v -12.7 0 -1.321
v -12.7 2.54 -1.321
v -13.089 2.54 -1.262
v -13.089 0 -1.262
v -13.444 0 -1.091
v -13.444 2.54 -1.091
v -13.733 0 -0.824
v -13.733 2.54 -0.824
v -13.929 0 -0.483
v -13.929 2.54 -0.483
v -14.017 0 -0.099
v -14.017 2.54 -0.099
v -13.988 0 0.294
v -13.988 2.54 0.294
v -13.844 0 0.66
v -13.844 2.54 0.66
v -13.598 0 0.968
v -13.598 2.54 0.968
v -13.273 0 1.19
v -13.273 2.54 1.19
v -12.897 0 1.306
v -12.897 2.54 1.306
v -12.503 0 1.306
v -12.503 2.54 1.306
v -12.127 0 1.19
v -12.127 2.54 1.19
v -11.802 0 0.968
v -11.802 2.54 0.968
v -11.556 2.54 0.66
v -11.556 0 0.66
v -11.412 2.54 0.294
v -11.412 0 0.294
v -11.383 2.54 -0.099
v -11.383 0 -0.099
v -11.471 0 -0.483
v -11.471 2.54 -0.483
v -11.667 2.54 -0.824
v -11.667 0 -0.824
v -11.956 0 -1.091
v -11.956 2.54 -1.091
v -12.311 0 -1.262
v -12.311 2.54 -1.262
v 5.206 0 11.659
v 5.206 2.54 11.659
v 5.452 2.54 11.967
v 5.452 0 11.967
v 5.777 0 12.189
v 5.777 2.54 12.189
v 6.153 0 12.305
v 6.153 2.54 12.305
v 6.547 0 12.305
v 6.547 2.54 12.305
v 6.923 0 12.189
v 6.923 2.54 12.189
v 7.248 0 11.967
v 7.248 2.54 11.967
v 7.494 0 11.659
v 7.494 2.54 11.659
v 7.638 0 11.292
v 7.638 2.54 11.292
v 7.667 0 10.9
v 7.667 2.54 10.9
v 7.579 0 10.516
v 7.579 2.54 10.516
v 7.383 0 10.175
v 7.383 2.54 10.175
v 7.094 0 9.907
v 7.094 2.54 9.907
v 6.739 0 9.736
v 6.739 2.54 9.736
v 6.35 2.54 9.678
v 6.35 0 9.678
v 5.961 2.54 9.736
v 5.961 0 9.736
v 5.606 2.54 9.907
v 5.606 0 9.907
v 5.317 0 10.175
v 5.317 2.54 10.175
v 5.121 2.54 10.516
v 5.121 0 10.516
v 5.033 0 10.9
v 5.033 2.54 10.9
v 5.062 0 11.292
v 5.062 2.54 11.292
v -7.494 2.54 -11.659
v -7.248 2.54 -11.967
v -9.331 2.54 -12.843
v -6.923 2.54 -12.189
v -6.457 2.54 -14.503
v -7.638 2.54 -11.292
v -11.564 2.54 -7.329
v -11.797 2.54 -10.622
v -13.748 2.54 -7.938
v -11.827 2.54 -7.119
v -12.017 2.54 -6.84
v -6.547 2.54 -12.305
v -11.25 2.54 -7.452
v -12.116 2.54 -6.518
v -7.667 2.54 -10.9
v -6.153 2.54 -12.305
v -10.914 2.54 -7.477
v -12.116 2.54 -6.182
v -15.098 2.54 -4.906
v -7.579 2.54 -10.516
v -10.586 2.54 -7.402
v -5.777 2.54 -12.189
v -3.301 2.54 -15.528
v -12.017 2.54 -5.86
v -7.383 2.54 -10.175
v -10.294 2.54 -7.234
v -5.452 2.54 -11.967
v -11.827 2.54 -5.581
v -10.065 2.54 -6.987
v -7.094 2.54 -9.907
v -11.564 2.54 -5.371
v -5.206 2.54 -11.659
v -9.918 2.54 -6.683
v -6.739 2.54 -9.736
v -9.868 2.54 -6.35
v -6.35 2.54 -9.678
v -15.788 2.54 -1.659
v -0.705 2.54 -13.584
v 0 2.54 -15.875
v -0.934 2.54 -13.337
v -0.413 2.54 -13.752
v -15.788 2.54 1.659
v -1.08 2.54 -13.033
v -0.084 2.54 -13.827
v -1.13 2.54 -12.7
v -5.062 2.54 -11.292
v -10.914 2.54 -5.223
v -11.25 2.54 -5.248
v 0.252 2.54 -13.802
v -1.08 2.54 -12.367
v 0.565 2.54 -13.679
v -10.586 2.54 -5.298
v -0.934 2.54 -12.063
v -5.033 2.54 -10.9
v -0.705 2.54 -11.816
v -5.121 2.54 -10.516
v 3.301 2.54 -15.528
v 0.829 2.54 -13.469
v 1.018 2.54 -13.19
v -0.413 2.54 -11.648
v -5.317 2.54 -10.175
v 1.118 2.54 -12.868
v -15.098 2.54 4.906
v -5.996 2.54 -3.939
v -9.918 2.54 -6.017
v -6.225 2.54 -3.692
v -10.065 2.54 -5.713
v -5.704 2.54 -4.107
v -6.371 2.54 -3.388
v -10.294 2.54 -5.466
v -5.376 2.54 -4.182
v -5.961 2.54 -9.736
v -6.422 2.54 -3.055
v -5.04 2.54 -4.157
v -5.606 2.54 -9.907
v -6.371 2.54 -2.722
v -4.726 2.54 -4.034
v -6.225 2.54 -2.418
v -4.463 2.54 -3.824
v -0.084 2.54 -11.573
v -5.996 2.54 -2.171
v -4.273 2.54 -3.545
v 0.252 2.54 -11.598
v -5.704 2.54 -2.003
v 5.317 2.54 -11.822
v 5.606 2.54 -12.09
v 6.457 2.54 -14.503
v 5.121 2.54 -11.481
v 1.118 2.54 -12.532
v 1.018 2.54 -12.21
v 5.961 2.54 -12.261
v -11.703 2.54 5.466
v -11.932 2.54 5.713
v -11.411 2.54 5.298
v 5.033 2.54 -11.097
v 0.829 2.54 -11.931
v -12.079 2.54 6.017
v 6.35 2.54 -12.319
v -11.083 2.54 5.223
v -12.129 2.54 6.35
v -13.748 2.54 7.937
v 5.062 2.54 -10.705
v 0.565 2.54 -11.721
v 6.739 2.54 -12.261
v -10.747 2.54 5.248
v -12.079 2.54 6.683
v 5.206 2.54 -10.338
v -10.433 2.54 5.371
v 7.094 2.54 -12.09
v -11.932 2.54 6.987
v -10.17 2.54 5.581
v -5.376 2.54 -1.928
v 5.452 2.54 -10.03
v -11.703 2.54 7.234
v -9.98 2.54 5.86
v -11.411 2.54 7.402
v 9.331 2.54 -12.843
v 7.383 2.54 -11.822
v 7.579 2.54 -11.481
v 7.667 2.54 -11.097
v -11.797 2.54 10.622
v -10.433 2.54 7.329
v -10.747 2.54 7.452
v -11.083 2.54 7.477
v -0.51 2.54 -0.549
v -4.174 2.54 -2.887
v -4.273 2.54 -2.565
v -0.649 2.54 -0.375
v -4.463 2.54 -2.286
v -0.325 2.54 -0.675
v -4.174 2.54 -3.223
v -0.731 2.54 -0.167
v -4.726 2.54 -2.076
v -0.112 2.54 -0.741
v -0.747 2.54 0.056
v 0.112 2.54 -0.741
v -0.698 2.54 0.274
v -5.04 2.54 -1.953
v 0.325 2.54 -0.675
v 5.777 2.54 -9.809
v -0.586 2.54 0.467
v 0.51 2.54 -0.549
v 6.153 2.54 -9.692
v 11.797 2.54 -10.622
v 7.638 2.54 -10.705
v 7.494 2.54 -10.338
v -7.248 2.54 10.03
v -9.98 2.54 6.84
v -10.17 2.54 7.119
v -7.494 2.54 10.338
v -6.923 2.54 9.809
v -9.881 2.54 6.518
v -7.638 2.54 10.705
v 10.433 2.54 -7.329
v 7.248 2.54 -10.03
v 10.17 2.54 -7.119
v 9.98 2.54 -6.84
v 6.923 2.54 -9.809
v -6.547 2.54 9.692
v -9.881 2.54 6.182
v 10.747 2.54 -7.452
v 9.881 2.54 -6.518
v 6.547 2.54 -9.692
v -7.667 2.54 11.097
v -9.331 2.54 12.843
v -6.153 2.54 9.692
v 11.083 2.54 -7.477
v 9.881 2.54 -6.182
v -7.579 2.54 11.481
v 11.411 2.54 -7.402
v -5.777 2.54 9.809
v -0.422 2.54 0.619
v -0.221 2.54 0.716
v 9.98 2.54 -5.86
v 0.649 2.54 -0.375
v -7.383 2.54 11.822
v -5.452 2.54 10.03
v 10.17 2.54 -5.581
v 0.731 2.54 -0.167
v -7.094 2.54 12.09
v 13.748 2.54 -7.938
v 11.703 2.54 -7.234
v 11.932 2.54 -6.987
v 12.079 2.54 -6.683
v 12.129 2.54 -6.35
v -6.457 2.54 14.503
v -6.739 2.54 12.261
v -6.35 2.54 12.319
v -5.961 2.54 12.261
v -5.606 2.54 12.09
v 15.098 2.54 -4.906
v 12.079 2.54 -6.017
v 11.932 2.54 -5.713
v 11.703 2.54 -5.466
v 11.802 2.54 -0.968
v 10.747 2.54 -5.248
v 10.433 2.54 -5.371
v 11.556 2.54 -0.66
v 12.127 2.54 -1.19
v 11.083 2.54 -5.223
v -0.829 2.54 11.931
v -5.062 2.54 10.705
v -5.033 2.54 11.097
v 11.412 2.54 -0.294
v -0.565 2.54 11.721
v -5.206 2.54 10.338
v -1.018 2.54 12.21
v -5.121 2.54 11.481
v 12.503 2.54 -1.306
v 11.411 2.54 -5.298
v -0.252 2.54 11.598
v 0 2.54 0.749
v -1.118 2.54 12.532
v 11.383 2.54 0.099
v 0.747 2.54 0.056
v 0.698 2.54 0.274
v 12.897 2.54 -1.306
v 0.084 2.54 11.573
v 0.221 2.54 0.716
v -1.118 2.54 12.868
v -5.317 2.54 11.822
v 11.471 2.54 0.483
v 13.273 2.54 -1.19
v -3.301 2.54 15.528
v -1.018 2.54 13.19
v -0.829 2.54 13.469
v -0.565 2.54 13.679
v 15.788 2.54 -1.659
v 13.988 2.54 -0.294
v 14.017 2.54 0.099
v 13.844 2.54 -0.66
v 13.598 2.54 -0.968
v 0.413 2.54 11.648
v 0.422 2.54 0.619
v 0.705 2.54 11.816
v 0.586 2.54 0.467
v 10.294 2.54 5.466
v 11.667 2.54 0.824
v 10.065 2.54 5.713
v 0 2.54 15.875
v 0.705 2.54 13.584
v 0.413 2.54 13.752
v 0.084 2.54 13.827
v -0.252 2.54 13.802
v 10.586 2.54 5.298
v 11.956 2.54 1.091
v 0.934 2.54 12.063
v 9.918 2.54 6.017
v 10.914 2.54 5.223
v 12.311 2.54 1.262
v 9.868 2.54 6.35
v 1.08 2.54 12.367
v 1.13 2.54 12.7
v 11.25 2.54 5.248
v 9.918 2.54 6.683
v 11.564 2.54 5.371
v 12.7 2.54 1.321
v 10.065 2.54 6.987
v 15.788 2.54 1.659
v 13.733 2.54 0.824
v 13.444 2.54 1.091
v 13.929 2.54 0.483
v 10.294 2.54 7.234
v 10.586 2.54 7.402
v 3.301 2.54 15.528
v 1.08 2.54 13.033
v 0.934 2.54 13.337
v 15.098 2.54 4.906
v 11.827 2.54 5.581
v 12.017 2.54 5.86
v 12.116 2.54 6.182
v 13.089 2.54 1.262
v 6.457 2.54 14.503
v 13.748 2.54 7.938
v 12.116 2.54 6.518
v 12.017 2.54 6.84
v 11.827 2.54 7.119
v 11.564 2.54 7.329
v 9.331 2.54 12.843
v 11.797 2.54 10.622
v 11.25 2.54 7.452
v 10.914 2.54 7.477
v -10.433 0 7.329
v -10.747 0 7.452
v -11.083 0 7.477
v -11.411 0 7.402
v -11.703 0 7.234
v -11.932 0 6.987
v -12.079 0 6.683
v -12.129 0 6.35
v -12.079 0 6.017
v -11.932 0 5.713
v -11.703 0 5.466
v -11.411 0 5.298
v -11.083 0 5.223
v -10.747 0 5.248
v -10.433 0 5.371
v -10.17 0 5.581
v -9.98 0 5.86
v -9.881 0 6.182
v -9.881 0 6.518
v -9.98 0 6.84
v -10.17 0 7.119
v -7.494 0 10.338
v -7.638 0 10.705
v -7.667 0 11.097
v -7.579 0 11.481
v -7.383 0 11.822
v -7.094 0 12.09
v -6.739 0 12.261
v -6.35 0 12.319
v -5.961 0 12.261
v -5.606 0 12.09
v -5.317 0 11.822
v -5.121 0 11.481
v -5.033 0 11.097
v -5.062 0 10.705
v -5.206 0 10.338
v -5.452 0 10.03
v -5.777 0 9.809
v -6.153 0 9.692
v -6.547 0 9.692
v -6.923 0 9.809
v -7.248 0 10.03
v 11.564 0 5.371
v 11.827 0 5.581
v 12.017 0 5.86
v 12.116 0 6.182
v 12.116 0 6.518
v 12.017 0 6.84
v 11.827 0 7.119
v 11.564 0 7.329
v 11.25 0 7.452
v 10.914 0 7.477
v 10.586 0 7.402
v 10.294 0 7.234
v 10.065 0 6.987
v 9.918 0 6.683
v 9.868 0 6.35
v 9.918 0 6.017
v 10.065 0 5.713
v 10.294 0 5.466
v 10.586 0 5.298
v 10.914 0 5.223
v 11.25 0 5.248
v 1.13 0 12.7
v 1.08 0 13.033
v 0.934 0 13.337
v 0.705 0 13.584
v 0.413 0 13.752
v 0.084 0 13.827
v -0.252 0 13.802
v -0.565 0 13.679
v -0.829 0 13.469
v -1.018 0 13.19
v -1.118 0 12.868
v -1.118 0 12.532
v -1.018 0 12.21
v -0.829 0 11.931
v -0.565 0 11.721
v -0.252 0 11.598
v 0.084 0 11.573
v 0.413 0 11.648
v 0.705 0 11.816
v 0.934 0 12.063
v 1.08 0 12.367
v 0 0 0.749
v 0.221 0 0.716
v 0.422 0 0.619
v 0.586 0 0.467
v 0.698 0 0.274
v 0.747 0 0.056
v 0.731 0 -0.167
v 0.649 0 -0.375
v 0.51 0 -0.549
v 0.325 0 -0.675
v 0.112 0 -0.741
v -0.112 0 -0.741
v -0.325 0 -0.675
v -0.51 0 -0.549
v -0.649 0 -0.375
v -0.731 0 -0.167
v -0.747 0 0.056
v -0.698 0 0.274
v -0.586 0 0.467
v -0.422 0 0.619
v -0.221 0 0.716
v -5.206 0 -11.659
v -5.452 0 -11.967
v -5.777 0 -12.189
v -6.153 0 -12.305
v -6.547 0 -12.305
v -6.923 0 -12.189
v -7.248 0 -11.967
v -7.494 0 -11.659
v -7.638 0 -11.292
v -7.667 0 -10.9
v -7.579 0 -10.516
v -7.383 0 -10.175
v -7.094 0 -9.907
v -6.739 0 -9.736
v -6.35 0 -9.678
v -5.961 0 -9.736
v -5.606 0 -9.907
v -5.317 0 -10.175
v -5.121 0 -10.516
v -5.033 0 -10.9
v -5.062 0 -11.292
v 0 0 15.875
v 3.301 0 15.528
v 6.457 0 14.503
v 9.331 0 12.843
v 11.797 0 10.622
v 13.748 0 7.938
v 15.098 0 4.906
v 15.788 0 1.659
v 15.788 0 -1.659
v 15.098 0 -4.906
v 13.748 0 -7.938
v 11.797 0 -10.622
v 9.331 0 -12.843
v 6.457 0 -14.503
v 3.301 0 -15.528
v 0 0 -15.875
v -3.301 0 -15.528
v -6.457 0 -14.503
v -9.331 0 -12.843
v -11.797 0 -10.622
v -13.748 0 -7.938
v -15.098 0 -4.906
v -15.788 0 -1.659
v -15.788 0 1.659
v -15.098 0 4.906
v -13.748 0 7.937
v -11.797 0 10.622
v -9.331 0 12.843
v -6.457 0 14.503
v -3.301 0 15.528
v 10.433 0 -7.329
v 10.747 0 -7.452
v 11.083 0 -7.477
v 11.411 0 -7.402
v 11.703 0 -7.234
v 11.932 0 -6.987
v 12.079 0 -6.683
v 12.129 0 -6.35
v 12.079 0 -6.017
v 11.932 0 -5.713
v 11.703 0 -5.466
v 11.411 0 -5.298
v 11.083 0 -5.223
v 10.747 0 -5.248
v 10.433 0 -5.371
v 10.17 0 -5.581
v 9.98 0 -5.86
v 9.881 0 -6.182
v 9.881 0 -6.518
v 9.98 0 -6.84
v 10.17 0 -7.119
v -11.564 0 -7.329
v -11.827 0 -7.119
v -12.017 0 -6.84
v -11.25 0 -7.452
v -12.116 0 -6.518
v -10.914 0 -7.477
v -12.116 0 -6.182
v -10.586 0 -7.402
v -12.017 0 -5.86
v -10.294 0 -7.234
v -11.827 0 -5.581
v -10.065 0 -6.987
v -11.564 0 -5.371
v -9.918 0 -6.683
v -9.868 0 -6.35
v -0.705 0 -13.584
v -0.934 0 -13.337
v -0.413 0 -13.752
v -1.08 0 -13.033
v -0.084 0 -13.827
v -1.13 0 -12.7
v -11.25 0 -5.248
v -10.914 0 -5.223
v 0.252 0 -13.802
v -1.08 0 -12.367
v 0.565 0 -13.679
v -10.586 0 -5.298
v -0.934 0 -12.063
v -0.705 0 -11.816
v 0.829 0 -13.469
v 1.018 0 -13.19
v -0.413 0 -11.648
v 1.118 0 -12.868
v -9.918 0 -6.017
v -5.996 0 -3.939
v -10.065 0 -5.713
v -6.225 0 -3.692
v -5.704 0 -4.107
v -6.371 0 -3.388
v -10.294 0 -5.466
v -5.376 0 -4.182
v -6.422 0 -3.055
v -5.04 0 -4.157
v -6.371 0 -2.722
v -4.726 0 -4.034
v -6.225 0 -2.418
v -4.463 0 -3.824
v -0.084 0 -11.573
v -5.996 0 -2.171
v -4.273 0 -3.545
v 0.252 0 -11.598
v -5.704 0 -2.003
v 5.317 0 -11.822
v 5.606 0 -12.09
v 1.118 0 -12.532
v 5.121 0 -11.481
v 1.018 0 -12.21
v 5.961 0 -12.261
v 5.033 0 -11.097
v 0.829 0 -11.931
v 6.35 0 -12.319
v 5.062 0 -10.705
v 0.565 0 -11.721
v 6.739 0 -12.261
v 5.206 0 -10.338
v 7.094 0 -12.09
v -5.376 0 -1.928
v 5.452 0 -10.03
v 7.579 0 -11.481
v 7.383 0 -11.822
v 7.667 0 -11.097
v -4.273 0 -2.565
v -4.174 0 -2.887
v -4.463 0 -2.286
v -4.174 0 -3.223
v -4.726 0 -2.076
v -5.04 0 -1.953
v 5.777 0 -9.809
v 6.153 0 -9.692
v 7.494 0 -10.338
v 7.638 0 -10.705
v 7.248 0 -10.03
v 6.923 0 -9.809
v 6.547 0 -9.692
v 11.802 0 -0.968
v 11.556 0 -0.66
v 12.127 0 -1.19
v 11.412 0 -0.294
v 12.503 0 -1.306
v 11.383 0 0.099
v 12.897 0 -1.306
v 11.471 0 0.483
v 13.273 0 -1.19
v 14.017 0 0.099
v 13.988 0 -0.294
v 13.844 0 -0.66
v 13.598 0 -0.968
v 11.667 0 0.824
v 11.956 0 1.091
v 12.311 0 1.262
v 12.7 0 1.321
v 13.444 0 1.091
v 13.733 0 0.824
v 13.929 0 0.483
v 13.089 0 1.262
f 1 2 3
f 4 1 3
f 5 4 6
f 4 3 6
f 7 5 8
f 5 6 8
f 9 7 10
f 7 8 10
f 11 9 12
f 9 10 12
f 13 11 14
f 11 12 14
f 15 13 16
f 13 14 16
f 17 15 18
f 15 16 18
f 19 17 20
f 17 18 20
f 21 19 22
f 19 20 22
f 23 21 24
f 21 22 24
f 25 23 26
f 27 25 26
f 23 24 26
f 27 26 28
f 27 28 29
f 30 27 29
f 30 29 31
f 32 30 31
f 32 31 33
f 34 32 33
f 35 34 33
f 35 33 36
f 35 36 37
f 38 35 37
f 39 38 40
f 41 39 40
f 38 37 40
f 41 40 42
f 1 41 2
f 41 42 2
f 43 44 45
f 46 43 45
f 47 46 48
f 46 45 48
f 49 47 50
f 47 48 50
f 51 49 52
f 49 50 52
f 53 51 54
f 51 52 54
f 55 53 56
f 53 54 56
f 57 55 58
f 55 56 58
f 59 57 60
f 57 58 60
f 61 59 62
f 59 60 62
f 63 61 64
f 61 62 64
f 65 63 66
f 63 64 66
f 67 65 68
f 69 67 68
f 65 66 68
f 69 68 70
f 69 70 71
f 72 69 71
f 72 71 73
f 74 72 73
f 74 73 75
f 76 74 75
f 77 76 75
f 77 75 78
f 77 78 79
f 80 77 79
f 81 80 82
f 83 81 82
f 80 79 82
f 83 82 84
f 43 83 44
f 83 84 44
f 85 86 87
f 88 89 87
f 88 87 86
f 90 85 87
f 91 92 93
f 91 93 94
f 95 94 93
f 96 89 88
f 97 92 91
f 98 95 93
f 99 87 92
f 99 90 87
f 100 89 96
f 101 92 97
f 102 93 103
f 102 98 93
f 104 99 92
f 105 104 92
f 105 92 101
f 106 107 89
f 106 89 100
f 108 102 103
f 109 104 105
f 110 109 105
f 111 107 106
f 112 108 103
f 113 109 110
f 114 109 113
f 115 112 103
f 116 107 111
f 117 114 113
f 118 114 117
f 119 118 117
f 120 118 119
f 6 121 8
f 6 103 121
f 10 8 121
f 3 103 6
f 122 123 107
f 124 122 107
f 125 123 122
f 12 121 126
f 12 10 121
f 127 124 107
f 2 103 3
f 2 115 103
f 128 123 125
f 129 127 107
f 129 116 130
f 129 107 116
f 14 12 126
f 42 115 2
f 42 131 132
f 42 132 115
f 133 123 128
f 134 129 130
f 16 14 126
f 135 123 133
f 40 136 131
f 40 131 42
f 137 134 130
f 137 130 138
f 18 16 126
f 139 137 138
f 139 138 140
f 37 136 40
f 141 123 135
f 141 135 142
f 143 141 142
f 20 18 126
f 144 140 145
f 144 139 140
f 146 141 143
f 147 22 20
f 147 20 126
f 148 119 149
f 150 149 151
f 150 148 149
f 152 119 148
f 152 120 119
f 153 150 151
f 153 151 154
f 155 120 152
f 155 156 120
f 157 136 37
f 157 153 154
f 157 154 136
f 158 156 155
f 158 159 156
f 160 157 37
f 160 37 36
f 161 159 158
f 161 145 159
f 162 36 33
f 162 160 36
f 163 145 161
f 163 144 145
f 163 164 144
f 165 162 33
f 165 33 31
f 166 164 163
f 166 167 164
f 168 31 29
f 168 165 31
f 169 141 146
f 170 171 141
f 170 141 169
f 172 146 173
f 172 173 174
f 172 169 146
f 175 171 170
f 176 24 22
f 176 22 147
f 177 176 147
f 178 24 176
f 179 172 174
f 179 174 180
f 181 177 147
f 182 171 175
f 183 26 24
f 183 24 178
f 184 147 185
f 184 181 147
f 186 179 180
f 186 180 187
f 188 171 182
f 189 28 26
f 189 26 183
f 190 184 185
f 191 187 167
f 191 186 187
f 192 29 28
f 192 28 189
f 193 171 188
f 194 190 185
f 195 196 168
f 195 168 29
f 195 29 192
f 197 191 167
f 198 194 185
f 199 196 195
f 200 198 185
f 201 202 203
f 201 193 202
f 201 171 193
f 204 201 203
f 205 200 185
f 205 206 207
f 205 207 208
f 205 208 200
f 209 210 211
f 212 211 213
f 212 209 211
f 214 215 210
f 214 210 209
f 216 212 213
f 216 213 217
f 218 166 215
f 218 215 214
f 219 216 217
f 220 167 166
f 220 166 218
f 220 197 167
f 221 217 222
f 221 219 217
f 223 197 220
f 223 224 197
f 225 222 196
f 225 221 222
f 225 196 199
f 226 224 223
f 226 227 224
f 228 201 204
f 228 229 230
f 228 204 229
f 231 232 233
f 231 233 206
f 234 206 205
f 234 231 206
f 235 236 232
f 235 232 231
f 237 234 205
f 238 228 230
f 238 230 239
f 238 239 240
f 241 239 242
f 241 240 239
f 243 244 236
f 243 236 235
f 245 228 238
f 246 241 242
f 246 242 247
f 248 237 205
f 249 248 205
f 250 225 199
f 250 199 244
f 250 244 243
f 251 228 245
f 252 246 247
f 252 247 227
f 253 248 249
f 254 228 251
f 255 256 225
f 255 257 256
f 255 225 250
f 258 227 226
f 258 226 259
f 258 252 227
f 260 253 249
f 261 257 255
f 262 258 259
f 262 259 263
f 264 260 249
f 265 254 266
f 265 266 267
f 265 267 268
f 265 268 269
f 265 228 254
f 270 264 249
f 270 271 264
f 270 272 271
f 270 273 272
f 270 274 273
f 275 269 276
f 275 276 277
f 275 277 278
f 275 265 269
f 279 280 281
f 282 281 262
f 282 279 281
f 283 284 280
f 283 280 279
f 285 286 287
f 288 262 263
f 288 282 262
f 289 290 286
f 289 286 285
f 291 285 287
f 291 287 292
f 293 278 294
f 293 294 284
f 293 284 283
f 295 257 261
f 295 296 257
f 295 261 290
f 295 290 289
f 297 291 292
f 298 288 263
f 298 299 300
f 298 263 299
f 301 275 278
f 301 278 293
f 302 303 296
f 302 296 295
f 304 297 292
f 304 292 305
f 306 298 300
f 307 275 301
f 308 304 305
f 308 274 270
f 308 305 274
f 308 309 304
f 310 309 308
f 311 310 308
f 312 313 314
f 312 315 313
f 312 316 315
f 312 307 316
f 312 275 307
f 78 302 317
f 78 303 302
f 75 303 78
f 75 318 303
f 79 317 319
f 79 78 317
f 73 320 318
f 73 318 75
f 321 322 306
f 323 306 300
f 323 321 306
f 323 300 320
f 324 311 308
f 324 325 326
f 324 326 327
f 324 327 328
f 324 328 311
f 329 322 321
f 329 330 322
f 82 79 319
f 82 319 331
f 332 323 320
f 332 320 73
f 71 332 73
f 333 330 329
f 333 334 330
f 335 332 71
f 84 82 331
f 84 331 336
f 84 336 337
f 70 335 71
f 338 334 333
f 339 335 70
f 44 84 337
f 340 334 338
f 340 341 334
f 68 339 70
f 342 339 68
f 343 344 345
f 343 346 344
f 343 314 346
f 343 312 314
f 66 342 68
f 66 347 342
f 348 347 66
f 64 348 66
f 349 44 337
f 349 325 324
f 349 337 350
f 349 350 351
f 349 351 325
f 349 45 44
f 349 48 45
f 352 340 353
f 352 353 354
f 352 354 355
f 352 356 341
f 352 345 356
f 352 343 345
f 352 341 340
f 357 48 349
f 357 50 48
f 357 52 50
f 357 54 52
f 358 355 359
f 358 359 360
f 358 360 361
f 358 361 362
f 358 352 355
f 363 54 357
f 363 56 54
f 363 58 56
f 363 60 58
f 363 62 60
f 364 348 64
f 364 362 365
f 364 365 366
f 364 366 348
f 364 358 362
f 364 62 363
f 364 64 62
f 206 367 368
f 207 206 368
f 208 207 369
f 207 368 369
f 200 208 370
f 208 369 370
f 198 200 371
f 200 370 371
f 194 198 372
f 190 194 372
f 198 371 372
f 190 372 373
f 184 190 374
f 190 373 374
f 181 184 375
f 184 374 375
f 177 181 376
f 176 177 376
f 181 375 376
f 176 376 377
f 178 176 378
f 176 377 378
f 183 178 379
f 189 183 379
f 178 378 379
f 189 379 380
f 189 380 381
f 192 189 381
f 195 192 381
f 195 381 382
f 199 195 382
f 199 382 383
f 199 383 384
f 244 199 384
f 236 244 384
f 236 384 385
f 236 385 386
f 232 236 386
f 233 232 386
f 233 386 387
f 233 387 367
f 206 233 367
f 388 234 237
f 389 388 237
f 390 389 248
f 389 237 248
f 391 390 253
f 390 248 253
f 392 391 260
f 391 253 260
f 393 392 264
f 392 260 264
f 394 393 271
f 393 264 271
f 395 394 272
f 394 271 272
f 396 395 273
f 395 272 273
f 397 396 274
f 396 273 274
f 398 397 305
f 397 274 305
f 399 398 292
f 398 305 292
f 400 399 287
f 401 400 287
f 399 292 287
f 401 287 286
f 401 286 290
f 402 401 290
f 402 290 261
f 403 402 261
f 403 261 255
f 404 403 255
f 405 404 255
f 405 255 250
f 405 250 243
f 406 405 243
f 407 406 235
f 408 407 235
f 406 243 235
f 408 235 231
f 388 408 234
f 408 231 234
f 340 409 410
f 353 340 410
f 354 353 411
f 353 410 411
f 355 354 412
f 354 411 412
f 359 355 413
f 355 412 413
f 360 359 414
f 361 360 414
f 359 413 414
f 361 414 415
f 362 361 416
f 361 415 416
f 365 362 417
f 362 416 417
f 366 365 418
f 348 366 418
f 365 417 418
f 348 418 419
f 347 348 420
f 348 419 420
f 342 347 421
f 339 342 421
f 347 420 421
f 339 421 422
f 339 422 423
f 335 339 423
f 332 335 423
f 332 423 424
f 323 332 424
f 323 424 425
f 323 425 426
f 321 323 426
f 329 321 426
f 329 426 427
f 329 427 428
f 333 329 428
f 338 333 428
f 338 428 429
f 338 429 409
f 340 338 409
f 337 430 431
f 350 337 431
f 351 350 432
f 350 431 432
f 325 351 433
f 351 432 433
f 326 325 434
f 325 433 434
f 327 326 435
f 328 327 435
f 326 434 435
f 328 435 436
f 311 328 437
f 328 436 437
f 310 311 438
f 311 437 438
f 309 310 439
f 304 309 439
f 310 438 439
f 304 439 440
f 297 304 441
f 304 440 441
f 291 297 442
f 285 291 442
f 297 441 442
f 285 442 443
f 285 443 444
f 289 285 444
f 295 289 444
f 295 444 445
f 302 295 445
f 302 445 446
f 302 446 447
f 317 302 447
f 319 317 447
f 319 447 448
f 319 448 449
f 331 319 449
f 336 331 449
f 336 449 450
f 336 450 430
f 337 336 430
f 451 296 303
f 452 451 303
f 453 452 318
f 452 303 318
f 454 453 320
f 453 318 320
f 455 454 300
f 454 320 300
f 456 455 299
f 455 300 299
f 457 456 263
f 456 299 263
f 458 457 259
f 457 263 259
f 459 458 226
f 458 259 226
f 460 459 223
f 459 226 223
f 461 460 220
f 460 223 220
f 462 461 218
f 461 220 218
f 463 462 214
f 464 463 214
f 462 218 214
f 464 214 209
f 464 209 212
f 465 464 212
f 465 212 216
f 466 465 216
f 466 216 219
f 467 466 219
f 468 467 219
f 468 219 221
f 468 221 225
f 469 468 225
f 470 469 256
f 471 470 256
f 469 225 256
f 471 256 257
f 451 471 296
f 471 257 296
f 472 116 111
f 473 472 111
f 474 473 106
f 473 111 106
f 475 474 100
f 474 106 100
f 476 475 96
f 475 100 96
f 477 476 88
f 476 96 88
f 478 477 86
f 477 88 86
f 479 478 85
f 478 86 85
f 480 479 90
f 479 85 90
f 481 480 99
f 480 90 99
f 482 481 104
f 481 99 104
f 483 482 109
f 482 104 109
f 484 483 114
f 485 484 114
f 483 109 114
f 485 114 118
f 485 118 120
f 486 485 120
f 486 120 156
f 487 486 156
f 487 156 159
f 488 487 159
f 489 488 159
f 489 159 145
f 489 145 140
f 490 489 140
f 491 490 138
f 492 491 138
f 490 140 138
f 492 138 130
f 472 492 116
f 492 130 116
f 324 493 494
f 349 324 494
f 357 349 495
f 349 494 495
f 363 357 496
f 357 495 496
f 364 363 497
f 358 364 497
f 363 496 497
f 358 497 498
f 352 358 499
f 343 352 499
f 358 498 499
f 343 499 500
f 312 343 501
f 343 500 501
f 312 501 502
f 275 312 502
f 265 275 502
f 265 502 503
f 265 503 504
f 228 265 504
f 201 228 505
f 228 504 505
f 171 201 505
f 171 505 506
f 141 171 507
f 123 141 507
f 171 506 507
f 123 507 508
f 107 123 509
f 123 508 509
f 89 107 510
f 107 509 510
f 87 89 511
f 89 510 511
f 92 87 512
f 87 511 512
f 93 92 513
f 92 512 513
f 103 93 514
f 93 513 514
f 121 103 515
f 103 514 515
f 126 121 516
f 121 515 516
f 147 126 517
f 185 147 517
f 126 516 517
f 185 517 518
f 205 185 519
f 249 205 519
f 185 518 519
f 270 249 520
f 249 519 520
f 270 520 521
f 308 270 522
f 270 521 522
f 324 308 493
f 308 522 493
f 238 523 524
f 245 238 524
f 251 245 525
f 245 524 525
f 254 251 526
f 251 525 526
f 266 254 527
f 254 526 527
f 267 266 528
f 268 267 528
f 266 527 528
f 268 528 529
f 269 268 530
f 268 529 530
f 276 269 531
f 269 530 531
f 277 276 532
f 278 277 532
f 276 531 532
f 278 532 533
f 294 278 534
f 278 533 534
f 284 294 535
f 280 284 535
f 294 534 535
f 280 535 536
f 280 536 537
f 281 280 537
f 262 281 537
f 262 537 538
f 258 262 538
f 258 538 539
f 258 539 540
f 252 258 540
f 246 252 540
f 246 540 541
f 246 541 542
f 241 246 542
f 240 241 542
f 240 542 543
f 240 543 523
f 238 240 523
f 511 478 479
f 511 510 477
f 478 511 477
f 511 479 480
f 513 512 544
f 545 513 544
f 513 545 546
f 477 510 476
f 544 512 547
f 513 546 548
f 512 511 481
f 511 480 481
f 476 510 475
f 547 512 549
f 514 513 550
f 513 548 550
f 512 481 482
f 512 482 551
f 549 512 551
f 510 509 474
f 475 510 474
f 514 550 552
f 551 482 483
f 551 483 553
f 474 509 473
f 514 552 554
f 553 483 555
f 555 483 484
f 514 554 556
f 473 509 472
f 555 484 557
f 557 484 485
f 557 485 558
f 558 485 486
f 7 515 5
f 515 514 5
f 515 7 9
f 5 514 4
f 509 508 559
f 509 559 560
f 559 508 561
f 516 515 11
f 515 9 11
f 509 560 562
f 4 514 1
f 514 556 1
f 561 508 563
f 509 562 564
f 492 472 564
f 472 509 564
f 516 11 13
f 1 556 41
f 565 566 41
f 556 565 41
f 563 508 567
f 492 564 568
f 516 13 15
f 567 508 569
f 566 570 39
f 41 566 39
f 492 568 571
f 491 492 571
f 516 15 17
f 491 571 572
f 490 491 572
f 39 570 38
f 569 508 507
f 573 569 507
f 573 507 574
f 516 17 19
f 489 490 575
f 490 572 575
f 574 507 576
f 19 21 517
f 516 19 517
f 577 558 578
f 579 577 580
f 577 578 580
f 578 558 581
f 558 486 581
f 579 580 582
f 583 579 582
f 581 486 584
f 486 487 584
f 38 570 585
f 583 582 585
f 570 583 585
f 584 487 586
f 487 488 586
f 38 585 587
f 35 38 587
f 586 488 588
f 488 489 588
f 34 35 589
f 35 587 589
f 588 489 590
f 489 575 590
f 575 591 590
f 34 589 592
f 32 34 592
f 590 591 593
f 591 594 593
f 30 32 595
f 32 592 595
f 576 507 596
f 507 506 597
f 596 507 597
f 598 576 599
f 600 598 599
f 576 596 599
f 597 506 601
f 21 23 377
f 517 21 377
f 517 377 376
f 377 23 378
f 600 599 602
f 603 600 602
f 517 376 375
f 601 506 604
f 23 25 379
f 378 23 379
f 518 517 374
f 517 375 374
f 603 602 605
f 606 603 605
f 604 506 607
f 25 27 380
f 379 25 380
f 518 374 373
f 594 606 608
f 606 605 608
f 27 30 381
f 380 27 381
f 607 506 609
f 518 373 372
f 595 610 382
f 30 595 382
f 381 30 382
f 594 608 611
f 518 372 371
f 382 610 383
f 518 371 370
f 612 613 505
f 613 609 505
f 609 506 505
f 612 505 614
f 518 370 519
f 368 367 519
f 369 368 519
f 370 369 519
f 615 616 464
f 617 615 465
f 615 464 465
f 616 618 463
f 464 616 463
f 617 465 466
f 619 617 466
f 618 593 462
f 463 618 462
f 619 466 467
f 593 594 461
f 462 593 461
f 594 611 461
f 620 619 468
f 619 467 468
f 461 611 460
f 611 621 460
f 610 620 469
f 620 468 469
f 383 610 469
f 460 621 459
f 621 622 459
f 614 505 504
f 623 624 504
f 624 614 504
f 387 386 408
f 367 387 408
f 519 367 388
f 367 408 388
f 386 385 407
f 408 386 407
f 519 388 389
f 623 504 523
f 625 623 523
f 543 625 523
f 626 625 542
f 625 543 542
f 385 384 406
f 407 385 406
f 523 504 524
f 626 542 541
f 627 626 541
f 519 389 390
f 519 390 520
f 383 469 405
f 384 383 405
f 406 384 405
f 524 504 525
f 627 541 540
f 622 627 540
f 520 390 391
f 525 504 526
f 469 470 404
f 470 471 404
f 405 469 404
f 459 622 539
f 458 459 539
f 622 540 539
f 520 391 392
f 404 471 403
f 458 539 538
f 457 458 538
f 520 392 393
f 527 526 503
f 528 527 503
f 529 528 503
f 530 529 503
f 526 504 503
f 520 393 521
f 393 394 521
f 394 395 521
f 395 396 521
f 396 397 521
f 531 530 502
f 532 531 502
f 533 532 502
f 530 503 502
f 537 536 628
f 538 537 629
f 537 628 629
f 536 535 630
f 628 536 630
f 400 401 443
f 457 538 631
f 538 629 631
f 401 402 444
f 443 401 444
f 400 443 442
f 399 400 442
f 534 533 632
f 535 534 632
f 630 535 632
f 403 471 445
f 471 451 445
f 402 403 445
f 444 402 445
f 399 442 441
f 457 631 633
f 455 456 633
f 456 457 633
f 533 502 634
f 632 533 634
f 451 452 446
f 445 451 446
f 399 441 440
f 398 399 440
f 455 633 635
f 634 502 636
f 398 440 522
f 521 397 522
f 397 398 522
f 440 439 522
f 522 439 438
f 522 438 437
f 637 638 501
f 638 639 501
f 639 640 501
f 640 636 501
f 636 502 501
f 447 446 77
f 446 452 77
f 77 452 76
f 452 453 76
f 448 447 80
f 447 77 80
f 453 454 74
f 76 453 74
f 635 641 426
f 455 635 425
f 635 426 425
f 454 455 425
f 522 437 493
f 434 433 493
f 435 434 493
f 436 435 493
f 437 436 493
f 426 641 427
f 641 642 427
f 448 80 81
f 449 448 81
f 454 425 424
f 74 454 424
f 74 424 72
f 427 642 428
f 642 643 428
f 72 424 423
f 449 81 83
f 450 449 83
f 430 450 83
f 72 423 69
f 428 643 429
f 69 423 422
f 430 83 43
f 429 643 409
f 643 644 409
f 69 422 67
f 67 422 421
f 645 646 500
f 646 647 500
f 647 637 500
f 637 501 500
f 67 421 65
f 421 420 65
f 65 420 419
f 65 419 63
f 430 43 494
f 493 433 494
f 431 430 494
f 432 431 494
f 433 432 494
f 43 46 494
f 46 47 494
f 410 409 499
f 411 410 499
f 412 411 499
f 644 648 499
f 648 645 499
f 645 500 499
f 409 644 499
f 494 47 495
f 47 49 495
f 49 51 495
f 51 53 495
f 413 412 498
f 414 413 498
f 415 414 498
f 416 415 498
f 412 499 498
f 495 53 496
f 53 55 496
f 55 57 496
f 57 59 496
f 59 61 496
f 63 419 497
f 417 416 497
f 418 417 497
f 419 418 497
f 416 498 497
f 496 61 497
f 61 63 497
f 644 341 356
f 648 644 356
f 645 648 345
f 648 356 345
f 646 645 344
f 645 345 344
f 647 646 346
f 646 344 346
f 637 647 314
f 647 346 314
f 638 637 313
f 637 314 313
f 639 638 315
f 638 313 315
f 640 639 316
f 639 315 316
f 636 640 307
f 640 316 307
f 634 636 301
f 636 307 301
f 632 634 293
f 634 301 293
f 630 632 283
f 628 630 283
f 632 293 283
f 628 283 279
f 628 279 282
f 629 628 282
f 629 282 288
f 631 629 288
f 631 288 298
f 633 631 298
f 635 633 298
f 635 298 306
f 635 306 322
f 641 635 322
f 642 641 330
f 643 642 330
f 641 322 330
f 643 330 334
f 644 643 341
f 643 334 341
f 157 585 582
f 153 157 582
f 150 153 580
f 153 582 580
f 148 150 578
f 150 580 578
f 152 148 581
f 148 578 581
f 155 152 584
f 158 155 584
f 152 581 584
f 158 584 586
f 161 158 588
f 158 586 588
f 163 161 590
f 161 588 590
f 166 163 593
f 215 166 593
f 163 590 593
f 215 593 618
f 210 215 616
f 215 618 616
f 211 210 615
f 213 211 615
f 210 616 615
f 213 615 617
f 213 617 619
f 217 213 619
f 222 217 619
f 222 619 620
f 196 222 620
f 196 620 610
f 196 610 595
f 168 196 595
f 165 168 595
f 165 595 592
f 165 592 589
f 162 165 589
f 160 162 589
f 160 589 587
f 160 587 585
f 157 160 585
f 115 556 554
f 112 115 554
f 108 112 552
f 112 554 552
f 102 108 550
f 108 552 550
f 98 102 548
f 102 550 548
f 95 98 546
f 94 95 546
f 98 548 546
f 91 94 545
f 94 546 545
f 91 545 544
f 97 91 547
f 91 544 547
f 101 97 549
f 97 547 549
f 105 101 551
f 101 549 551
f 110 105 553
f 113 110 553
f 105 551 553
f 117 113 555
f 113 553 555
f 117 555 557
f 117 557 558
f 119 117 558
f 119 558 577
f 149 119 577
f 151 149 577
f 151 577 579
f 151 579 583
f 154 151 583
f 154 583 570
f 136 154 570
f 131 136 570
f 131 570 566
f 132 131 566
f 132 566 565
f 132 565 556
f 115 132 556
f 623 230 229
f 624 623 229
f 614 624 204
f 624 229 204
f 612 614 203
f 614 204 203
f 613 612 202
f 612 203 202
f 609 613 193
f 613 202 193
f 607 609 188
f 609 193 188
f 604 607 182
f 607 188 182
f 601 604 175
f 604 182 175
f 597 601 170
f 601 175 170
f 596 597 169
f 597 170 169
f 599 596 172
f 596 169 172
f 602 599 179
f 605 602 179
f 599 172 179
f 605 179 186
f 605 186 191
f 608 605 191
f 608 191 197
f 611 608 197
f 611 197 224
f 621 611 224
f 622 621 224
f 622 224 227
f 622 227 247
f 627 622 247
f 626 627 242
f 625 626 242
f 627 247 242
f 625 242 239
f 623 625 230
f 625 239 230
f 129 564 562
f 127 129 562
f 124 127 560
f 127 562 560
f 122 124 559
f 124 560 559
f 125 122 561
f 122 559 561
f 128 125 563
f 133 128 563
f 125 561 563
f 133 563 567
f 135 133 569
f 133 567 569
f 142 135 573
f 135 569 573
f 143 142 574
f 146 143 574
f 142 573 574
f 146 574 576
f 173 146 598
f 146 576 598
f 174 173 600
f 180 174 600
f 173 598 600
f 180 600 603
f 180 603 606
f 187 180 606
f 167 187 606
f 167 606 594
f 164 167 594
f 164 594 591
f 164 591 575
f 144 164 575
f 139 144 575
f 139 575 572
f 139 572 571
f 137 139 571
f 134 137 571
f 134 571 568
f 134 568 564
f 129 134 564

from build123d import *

# Parameters (mm, degrees)
SKETCH1_R                 = 15.875
BOSS_EXTRUDE1_DEPTH       = 2.54
TAP_DRILL_FOR_4_40_TAP1_D = 2.2606
CIRPATTERN1_COUNT         = 6
SKETCH8_R                 = 0.7493
CUT_EXTRUDE1_DEPTH        = 2.54
SKETCH15_R                = 1.3208
CUT_EXTRUDE2_DEPTH        = 2.54
CIRPATTERN2_COUNT         = 6
F_4_40_TAPPED_HOLE3_D     = 2.2606


with BuildPart() as part:
    # Sketch1 → Boss-Extrude1 (new body)
    with BuildSketch(Plane(origin=(0, 0, 0), x_dir=(1, 0, 0), z_dir=(0, 1, 0))):
        with Locations(Location((0, 0, 0), (0, 0, 270))):
            Circle(SKETCH1_R)
    extrude(amount=BOSS_EXTRUDE1_DEPTH)

    # Tap Drill for #4-40 Tap1 (through all)
    with Locations(Plane(origin=(0, 2.54, 0), x_dir=(1, 0, 0), z_dir=(0, 1, 0))):
        with Locations((0, 12.7)):
            tap_drill_for_4_40_tap1 = Hole(TAP_DRILL_FOR_4_40_TAP1_D / 2)

    # CirPattern1: Tap Drill for #4-40 Tap1 ×6 about axis
    cirpattern1_axis = Axis((0, 0, 0), (0, 1, 0))
    for i in range(1, CIRPATTERN1_COUNT):
        add(tap_drill_for_4_40_tap1.rotate(cirpattern1_axis, i * 360 / CIRPATTERN1_COUNT), mode=Mode.SUBTRACT)

    # Sketch8 → Cut-Extrude1 (cut)
    with BuildSketch(Plane(origin=(0, 2.54, 0), x_dir=(1, 0, 0), z_dir=(0, 1, 0))):
        with Locations(Location((0, 0, 0), (0, 0, 270))):
            Circle(SKETCH8_R)
    extrude(amount=-CUT_EXTRUDE1_DEPTH, mode=Mode.SUBTRACT)

    # Sketch15 → Cut-Extrude2 (cut)
    with BuildSketch(Plane(origin=(0, 2.54, 0), x_dir=(1, 0, 0), z_dir=(0, 1, 0))):
        with Locations(Location((12.7, 0, 0), (0, 0, 270))):
            Circle(SKETCH15_R)
    cut_extrude2 = extrude(amount=-CUT_EXTRUDE2_DEPTH, mode=Mode.SUBTRACT)

    # CirPattern2: Cut-Extrude2 ×6 about axis
    cirpattern2_axis = Axis((0, 0, 0), (0, 1, 0))
    for i in range(1, CIRPATTERN2_COUNT):
        add(cut_extrude2.rotate(cirpattern2_axis, i * 360 / CIRPATTERN2_COUNT), mode=Mode.SUBTRACT)

    # #4-40 Tapped Hole3 (through all)
    with Locations(Plane(origin=(0, 2.54, 0), x_dir=(1, 0, 0), z_dir=(0, 1, 0))):
        with Locations((-5.291415217, 3.055)):
            Hole(F_4_40_TAPPED_HOLE3_D / 2)


solid = part.part
